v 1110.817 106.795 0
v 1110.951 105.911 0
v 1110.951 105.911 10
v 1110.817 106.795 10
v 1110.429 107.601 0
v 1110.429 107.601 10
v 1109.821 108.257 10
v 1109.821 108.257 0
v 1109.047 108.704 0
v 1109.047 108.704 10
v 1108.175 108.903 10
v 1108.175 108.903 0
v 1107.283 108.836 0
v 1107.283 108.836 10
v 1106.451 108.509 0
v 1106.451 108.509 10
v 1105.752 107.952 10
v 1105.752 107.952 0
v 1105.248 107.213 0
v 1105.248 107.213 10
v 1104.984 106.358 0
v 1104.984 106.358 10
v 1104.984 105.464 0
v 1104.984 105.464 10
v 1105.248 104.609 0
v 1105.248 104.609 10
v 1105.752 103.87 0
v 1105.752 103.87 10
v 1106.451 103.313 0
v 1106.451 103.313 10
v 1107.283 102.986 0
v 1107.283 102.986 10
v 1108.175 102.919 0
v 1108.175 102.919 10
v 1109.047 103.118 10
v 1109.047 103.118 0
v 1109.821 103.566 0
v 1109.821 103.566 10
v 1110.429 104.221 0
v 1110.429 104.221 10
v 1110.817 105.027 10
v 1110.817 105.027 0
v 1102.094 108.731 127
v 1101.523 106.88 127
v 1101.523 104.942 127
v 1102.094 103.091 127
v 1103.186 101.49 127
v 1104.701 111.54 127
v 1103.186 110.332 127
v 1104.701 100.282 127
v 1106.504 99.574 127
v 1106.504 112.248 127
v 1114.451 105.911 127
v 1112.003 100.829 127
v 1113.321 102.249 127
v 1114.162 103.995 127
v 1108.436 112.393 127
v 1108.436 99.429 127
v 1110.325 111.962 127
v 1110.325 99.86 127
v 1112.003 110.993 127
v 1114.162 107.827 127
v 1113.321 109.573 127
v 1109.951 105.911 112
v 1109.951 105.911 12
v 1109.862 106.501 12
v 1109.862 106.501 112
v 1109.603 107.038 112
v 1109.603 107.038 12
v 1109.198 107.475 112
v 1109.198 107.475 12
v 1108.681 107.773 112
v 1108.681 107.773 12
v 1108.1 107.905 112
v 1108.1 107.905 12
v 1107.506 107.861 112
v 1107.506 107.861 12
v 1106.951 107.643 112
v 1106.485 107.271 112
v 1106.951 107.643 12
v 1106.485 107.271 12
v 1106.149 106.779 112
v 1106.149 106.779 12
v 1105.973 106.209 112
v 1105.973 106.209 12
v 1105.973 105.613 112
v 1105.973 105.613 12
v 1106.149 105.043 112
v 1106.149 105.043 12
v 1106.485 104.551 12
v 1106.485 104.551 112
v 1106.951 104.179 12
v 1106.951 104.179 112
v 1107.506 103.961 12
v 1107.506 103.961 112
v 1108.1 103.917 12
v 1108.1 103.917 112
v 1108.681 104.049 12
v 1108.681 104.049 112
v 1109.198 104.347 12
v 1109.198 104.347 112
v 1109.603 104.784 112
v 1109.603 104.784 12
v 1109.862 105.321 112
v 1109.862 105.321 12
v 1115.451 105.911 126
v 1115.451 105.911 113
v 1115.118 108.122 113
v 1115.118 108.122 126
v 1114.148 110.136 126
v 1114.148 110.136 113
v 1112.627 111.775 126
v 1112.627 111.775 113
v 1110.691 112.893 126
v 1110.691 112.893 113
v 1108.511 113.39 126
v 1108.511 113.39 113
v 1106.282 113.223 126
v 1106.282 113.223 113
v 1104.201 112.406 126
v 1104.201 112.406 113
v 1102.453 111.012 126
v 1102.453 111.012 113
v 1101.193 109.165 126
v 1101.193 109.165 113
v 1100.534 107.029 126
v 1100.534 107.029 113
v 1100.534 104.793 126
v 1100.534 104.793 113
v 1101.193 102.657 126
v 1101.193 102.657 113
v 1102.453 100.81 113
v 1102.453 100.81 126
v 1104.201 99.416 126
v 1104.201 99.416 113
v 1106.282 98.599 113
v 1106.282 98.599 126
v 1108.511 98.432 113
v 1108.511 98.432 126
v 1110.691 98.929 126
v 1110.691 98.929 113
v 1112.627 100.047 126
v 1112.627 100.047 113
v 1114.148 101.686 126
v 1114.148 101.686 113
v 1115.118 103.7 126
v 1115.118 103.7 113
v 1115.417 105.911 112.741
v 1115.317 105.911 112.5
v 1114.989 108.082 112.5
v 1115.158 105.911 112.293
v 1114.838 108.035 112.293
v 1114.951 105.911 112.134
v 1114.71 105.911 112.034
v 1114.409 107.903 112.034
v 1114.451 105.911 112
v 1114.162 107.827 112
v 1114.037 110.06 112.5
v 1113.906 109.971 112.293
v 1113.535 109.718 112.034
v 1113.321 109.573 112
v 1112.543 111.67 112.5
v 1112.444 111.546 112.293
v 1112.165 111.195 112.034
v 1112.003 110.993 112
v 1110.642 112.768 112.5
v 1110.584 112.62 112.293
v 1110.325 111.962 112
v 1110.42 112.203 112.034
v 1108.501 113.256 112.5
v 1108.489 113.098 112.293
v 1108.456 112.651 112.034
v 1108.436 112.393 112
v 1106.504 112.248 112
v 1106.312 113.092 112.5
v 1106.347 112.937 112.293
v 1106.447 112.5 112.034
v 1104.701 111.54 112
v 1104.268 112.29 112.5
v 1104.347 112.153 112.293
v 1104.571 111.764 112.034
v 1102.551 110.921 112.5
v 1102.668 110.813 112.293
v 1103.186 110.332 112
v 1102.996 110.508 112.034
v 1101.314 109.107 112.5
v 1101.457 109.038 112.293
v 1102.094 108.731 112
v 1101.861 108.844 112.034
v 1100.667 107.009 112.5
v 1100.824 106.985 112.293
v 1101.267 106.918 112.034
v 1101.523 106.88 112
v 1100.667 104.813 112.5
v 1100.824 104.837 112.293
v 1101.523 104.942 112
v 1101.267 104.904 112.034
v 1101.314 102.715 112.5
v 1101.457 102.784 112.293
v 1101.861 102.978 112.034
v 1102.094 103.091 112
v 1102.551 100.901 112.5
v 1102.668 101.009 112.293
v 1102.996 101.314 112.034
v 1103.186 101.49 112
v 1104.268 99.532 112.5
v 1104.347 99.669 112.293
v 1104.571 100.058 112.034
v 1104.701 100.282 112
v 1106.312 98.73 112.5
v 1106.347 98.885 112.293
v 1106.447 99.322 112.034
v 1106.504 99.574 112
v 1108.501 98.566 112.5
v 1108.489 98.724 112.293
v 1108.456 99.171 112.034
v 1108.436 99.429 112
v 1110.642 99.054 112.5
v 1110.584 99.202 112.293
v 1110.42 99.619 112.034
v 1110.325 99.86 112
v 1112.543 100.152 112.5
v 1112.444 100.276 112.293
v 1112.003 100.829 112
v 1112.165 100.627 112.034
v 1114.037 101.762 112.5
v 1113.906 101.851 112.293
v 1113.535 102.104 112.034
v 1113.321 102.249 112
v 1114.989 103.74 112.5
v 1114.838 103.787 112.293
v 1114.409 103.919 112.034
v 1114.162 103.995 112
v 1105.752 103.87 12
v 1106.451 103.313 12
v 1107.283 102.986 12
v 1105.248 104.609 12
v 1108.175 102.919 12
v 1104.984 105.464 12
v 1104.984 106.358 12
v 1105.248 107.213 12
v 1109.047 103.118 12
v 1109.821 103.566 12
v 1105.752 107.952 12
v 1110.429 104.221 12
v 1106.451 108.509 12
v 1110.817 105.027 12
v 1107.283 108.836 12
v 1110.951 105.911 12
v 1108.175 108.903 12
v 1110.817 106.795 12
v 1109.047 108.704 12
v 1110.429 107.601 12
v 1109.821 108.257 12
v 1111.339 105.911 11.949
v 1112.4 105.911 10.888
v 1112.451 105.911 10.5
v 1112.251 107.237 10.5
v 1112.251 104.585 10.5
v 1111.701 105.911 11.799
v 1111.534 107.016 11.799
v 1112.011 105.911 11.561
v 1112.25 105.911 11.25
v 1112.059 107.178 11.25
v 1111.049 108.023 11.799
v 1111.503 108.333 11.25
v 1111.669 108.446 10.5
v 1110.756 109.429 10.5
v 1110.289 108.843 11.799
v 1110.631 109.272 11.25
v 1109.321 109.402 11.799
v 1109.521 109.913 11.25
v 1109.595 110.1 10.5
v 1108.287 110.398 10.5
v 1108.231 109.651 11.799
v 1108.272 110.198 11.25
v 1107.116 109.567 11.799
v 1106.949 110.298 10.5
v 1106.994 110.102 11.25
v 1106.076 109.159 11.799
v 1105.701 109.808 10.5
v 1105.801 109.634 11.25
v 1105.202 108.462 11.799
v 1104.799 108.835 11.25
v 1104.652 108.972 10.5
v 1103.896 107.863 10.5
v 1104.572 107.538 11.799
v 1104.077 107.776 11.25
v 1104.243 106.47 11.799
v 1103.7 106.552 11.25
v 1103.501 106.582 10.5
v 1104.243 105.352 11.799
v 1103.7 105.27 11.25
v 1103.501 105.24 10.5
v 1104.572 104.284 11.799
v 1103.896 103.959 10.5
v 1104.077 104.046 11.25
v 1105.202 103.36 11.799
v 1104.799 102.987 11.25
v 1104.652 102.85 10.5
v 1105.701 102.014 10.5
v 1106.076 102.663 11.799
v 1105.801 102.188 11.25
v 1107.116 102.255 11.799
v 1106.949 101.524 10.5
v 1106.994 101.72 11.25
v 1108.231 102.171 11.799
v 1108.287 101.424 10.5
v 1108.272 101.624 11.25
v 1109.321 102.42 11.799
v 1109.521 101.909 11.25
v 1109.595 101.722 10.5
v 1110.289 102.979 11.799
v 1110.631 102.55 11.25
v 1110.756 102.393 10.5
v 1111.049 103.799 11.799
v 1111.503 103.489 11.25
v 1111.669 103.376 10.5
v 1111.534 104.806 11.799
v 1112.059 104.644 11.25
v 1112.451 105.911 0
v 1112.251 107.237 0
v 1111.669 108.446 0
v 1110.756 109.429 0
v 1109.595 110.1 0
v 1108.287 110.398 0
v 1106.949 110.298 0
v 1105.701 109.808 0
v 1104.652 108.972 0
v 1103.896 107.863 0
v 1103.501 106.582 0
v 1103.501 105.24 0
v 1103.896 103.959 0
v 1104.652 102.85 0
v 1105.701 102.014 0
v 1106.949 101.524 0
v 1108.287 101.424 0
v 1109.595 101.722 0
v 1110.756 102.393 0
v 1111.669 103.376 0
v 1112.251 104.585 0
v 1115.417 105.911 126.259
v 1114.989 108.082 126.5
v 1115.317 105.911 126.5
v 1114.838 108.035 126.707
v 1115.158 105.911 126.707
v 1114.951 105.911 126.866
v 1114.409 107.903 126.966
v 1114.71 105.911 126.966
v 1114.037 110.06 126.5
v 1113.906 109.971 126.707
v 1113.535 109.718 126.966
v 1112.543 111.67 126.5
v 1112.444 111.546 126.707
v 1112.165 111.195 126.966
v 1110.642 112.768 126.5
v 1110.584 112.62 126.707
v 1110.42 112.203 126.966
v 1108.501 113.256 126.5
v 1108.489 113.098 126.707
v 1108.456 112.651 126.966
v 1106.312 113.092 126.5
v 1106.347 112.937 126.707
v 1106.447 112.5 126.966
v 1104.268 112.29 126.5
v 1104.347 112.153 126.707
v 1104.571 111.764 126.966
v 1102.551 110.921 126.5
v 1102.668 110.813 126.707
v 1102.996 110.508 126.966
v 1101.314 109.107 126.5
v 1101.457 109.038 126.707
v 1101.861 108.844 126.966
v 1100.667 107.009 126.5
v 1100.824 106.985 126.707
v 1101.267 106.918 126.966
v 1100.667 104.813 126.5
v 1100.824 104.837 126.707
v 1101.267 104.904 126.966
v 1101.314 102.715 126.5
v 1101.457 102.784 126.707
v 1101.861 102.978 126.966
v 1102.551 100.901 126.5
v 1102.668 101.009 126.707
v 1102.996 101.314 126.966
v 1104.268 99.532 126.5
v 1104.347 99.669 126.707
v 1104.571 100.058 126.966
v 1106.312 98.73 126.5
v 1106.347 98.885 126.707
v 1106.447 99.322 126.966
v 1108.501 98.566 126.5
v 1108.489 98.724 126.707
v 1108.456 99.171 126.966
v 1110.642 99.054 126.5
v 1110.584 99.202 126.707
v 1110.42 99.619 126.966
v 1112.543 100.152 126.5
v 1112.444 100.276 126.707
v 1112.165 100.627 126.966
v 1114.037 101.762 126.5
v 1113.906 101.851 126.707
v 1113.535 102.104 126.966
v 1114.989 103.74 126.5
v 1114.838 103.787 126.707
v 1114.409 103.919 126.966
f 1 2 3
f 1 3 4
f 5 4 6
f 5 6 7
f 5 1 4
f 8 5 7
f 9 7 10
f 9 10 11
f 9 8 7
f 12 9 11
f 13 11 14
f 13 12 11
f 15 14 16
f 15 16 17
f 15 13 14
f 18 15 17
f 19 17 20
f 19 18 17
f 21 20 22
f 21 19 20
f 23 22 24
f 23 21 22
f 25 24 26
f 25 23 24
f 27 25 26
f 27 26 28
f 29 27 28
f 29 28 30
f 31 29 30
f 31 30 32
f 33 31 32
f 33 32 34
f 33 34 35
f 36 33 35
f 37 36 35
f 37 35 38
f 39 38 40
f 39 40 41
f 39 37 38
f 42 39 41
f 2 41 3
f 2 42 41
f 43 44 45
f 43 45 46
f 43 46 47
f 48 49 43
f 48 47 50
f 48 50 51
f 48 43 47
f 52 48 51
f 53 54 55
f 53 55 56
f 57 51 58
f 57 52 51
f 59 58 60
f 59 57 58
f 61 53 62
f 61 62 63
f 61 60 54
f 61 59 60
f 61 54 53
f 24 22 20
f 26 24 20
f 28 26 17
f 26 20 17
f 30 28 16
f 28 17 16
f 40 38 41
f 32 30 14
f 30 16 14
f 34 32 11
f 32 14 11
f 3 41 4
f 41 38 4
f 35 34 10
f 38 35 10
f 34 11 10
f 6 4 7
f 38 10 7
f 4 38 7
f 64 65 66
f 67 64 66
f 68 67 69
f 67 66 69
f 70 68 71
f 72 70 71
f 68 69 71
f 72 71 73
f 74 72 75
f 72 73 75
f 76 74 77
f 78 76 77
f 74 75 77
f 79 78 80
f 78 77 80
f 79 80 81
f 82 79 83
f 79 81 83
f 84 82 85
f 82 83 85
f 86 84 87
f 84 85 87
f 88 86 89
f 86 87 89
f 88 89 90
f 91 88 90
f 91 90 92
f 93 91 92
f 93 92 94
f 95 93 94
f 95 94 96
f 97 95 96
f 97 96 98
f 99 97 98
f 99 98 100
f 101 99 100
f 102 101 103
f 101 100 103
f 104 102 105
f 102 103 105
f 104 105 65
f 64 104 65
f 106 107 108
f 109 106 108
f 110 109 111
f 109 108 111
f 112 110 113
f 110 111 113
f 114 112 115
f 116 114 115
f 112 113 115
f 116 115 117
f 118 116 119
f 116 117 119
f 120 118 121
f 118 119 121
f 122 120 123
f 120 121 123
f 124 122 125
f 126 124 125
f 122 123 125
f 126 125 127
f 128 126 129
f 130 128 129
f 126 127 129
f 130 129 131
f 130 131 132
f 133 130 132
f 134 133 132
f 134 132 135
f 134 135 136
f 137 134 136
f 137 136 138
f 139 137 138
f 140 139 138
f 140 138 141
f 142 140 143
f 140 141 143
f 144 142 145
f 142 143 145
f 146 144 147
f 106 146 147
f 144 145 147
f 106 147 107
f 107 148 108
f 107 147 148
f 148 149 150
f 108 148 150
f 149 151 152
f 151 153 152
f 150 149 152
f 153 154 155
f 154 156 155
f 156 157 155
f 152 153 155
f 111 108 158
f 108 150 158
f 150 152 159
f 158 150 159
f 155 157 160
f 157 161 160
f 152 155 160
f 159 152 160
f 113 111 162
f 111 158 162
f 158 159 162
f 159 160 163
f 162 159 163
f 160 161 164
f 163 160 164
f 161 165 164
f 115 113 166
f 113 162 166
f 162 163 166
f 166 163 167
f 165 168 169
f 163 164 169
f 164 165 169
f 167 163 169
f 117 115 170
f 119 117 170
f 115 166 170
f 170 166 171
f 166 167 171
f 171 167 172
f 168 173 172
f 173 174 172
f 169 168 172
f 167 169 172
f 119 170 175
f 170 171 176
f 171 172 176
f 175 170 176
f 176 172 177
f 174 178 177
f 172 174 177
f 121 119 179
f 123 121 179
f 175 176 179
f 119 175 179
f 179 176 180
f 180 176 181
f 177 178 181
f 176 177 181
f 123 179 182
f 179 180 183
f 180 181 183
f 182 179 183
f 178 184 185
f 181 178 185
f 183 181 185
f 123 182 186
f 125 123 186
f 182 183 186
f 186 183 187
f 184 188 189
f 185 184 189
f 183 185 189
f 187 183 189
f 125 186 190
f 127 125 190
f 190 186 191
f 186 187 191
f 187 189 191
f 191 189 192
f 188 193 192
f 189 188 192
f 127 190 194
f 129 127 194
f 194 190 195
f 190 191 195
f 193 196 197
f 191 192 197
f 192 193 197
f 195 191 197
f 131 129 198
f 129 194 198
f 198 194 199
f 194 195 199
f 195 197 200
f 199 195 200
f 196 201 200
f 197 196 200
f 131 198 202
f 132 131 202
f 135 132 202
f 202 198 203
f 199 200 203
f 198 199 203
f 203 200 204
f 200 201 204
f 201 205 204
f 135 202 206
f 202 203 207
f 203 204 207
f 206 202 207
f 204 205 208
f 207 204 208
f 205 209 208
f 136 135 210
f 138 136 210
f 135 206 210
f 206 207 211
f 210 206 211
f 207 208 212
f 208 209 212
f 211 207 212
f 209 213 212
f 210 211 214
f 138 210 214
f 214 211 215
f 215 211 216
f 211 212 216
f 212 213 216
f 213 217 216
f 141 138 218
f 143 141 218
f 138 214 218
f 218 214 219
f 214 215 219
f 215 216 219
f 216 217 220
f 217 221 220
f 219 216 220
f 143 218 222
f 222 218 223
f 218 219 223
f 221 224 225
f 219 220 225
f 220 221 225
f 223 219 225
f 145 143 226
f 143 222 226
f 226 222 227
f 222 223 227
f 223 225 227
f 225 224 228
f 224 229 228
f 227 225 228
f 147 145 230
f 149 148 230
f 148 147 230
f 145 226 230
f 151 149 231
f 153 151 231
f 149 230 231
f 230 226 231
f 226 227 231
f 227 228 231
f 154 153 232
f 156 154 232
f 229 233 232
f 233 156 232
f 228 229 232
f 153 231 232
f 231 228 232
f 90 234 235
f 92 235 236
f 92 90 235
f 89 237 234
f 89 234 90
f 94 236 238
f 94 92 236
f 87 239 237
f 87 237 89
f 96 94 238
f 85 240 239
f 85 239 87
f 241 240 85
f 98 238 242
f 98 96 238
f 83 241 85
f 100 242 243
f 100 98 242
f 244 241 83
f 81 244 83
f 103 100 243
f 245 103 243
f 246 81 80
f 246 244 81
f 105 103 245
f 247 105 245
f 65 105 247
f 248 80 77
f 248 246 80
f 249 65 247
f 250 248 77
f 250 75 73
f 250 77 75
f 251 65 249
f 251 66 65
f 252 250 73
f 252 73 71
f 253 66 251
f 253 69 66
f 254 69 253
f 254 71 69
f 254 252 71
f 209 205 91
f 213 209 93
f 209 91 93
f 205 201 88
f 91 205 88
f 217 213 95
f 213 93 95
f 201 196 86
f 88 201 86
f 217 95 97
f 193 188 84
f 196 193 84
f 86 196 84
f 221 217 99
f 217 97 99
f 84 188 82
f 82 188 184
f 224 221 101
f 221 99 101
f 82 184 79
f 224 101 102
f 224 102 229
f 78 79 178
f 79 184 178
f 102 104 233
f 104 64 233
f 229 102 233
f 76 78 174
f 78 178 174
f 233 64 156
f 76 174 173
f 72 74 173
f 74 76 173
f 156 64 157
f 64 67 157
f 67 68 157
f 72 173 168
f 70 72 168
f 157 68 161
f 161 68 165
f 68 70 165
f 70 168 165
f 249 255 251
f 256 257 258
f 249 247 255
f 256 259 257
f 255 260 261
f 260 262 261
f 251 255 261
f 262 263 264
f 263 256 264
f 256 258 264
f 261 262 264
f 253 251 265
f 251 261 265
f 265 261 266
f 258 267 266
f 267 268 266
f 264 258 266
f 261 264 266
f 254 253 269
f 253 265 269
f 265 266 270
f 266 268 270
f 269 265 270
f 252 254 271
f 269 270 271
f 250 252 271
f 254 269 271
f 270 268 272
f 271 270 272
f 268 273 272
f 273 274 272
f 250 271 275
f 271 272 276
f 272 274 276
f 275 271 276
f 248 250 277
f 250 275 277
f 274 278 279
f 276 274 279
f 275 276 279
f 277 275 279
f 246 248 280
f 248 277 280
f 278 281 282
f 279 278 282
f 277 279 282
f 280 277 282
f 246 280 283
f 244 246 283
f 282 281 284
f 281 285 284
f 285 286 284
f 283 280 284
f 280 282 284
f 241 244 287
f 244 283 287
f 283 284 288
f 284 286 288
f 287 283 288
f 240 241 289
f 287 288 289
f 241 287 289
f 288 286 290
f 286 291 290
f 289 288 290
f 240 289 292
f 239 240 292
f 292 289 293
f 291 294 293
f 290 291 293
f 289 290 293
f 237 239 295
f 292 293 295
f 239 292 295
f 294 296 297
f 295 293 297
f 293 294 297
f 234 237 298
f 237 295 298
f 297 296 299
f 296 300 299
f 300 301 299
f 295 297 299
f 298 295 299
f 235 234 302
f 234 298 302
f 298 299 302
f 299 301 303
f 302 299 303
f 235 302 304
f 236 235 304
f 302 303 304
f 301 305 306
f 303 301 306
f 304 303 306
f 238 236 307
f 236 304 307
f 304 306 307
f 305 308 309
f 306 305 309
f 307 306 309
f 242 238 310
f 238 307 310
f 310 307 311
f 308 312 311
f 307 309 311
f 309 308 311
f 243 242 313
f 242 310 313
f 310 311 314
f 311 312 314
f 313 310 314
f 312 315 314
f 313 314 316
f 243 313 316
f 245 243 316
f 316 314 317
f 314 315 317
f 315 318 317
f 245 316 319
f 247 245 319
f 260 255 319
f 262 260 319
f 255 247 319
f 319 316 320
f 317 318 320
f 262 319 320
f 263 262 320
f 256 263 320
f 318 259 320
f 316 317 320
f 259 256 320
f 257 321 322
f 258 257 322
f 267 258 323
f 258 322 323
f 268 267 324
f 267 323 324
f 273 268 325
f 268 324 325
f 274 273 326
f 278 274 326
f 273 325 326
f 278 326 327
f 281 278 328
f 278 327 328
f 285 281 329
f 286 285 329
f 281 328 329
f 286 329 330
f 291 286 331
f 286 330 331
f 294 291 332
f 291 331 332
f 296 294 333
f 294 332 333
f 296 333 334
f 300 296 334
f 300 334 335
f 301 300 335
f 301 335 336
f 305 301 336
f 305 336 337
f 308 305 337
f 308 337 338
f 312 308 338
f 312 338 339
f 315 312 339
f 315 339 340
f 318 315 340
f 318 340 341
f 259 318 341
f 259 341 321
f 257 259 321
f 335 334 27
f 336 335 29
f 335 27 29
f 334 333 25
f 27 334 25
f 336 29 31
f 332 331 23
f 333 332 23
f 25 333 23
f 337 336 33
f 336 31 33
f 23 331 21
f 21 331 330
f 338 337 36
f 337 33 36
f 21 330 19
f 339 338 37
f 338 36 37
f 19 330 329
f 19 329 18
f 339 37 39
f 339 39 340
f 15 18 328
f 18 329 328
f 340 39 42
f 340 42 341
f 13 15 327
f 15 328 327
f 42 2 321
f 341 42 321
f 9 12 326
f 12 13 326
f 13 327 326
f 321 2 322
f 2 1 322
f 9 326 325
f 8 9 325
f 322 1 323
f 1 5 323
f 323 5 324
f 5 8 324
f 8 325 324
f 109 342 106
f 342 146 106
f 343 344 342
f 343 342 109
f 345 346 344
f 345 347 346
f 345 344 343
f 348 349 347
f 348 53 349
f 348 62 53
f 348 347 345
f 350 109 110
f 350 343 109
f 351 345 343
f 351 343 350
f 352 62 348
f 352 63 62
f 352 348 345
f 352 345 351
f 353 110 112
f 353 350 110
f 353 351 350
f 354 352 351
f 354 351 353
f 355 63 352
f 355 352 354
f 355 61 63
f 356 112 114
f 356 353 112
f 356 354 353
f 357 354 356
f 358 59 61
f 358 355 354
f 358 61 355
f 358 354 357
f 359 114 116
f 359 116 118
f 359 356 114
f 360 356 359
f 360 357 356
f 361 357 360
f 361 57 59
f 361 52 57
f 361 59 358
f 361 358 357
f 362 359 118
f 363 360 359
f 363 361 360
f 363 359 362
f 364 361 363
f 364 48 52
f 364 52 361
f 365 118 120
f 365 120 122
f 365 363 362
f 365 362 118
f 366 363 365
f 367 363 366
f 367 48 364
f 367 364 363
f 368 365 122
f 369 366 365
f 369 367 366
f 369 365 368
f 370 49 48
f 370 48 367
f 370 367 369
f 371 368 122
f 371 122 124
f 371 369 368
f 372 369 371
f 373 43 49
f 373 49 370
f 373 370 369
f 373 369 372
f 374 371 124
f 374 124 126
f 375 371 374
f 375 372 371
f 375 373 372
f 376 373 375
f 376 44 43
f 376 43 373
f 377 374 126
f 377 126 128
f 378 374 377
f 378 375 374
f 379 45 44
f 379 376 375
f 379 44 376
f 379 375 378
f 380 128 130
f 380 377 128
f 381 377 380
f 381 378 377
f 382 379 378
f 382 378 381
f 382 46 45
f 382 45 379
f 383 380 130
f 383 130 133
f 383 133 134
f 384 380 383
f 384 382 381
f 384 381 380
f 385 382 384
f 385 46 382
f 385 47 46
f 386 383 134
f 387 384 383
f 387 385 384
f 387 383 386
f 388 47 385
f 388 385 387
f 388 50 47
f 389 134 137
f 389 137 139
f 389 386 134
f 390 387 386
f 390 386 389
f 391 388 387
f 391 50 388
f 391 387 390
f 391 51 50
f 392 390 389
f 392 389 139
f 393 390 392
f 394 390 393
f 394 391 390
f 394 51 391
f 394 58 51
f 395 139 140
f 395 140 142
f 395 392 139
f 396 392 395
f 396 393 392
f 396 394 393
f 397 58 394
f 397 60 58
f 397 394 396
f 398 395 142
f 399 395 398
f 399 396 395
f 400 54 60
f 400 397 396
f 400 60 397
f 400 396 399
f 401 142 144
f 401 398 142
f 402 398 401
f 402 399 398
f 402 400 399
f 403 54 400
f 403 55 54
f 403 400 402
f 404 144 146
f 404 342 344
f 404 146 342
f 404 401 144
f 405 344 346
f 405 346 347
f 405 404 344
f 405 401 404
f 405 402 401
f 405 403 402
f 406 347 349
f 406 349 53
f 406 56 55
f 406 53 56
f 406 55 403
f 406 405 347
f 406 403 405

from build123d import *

# Parameters (mm, degrees)
SKETCH1_R           = 4.5
SKETCH1_R_2         = 3
BOSS_EXTRUDE1_DEPTH = 10
SKETCH2_R           = 4.5
BOSS_EXTRUDE2_DEPTH = 2
SKETCH3_R           = 2
BOSS_EXTRUDE3_DEPTH = 100
SKETCH4_R           = 7.5
BOSS_EXTRUDE4_DEPTH = 15
FILLET1_R           = 1
FILLET2_R           = 1.5


with BuildPart() as part:
    # Sketch1 → Boss-Extrude1 (new body)
    with BuildSketch(Plane.XY):
        with Locations((1107.950719415, 105.911007762)):
            Circle(SKETCH1_R)
        with Locations((1107.950719415, 105.911007762)):
            Circle(SKETCH1_R_2, mode=Mode.SUBTRACT)
    extrude(amount=BOSS_EXTRUDE1_DEPTH)

    # Sketch2 → Boss-Extrude2 (add)
    with BuildSketch(Plane.XY.offset(10)):
        with Locations((1107.950719415, 105.911007762)):
            Circle(SKETCH2_R)
    extrude(amount=BOSS_EXTRUDE2_DEPTH)

    # Sketch3 → Boss-Extrude3 (add)
    with BuildSketch(Plane.XY.offset(12)):
        with Locations((1107.950719415, 105.911007762)):
            Circle(SKETCH3_R)
    extrude(amount=BOSS_EXTRUDE3_DEPTH)

    # Sketch4 → Boss-Extrude4 (add)
    with BuildSketch(Plane.XY.offset(112)):
        with Locations((1107.950719415, 105.911007762)):
            Circle(SKETCH4_R)
    extrude(amount=BOSS_EXTRUDE4_DEPTH)

    # Fillet1
    fillet1_edges = [part.edges().sort_by_distance(p)[0] for p in [
        (1100.450719415, 105.911007762, 112),
        (1100.450719415, 105.911007762, 127),
    ]]
    fillet(fillet1_edges, radius=FILLET1_R)

    # Fillet2
    fillet2_edges = [part.edges().sort_by_distance(p)[0] for p in [
        (1103.450719415, 105.911007762, 12),
    ]]
    fillet(fillet2_edges, radius=FILLET2_R)


solid = part.part
